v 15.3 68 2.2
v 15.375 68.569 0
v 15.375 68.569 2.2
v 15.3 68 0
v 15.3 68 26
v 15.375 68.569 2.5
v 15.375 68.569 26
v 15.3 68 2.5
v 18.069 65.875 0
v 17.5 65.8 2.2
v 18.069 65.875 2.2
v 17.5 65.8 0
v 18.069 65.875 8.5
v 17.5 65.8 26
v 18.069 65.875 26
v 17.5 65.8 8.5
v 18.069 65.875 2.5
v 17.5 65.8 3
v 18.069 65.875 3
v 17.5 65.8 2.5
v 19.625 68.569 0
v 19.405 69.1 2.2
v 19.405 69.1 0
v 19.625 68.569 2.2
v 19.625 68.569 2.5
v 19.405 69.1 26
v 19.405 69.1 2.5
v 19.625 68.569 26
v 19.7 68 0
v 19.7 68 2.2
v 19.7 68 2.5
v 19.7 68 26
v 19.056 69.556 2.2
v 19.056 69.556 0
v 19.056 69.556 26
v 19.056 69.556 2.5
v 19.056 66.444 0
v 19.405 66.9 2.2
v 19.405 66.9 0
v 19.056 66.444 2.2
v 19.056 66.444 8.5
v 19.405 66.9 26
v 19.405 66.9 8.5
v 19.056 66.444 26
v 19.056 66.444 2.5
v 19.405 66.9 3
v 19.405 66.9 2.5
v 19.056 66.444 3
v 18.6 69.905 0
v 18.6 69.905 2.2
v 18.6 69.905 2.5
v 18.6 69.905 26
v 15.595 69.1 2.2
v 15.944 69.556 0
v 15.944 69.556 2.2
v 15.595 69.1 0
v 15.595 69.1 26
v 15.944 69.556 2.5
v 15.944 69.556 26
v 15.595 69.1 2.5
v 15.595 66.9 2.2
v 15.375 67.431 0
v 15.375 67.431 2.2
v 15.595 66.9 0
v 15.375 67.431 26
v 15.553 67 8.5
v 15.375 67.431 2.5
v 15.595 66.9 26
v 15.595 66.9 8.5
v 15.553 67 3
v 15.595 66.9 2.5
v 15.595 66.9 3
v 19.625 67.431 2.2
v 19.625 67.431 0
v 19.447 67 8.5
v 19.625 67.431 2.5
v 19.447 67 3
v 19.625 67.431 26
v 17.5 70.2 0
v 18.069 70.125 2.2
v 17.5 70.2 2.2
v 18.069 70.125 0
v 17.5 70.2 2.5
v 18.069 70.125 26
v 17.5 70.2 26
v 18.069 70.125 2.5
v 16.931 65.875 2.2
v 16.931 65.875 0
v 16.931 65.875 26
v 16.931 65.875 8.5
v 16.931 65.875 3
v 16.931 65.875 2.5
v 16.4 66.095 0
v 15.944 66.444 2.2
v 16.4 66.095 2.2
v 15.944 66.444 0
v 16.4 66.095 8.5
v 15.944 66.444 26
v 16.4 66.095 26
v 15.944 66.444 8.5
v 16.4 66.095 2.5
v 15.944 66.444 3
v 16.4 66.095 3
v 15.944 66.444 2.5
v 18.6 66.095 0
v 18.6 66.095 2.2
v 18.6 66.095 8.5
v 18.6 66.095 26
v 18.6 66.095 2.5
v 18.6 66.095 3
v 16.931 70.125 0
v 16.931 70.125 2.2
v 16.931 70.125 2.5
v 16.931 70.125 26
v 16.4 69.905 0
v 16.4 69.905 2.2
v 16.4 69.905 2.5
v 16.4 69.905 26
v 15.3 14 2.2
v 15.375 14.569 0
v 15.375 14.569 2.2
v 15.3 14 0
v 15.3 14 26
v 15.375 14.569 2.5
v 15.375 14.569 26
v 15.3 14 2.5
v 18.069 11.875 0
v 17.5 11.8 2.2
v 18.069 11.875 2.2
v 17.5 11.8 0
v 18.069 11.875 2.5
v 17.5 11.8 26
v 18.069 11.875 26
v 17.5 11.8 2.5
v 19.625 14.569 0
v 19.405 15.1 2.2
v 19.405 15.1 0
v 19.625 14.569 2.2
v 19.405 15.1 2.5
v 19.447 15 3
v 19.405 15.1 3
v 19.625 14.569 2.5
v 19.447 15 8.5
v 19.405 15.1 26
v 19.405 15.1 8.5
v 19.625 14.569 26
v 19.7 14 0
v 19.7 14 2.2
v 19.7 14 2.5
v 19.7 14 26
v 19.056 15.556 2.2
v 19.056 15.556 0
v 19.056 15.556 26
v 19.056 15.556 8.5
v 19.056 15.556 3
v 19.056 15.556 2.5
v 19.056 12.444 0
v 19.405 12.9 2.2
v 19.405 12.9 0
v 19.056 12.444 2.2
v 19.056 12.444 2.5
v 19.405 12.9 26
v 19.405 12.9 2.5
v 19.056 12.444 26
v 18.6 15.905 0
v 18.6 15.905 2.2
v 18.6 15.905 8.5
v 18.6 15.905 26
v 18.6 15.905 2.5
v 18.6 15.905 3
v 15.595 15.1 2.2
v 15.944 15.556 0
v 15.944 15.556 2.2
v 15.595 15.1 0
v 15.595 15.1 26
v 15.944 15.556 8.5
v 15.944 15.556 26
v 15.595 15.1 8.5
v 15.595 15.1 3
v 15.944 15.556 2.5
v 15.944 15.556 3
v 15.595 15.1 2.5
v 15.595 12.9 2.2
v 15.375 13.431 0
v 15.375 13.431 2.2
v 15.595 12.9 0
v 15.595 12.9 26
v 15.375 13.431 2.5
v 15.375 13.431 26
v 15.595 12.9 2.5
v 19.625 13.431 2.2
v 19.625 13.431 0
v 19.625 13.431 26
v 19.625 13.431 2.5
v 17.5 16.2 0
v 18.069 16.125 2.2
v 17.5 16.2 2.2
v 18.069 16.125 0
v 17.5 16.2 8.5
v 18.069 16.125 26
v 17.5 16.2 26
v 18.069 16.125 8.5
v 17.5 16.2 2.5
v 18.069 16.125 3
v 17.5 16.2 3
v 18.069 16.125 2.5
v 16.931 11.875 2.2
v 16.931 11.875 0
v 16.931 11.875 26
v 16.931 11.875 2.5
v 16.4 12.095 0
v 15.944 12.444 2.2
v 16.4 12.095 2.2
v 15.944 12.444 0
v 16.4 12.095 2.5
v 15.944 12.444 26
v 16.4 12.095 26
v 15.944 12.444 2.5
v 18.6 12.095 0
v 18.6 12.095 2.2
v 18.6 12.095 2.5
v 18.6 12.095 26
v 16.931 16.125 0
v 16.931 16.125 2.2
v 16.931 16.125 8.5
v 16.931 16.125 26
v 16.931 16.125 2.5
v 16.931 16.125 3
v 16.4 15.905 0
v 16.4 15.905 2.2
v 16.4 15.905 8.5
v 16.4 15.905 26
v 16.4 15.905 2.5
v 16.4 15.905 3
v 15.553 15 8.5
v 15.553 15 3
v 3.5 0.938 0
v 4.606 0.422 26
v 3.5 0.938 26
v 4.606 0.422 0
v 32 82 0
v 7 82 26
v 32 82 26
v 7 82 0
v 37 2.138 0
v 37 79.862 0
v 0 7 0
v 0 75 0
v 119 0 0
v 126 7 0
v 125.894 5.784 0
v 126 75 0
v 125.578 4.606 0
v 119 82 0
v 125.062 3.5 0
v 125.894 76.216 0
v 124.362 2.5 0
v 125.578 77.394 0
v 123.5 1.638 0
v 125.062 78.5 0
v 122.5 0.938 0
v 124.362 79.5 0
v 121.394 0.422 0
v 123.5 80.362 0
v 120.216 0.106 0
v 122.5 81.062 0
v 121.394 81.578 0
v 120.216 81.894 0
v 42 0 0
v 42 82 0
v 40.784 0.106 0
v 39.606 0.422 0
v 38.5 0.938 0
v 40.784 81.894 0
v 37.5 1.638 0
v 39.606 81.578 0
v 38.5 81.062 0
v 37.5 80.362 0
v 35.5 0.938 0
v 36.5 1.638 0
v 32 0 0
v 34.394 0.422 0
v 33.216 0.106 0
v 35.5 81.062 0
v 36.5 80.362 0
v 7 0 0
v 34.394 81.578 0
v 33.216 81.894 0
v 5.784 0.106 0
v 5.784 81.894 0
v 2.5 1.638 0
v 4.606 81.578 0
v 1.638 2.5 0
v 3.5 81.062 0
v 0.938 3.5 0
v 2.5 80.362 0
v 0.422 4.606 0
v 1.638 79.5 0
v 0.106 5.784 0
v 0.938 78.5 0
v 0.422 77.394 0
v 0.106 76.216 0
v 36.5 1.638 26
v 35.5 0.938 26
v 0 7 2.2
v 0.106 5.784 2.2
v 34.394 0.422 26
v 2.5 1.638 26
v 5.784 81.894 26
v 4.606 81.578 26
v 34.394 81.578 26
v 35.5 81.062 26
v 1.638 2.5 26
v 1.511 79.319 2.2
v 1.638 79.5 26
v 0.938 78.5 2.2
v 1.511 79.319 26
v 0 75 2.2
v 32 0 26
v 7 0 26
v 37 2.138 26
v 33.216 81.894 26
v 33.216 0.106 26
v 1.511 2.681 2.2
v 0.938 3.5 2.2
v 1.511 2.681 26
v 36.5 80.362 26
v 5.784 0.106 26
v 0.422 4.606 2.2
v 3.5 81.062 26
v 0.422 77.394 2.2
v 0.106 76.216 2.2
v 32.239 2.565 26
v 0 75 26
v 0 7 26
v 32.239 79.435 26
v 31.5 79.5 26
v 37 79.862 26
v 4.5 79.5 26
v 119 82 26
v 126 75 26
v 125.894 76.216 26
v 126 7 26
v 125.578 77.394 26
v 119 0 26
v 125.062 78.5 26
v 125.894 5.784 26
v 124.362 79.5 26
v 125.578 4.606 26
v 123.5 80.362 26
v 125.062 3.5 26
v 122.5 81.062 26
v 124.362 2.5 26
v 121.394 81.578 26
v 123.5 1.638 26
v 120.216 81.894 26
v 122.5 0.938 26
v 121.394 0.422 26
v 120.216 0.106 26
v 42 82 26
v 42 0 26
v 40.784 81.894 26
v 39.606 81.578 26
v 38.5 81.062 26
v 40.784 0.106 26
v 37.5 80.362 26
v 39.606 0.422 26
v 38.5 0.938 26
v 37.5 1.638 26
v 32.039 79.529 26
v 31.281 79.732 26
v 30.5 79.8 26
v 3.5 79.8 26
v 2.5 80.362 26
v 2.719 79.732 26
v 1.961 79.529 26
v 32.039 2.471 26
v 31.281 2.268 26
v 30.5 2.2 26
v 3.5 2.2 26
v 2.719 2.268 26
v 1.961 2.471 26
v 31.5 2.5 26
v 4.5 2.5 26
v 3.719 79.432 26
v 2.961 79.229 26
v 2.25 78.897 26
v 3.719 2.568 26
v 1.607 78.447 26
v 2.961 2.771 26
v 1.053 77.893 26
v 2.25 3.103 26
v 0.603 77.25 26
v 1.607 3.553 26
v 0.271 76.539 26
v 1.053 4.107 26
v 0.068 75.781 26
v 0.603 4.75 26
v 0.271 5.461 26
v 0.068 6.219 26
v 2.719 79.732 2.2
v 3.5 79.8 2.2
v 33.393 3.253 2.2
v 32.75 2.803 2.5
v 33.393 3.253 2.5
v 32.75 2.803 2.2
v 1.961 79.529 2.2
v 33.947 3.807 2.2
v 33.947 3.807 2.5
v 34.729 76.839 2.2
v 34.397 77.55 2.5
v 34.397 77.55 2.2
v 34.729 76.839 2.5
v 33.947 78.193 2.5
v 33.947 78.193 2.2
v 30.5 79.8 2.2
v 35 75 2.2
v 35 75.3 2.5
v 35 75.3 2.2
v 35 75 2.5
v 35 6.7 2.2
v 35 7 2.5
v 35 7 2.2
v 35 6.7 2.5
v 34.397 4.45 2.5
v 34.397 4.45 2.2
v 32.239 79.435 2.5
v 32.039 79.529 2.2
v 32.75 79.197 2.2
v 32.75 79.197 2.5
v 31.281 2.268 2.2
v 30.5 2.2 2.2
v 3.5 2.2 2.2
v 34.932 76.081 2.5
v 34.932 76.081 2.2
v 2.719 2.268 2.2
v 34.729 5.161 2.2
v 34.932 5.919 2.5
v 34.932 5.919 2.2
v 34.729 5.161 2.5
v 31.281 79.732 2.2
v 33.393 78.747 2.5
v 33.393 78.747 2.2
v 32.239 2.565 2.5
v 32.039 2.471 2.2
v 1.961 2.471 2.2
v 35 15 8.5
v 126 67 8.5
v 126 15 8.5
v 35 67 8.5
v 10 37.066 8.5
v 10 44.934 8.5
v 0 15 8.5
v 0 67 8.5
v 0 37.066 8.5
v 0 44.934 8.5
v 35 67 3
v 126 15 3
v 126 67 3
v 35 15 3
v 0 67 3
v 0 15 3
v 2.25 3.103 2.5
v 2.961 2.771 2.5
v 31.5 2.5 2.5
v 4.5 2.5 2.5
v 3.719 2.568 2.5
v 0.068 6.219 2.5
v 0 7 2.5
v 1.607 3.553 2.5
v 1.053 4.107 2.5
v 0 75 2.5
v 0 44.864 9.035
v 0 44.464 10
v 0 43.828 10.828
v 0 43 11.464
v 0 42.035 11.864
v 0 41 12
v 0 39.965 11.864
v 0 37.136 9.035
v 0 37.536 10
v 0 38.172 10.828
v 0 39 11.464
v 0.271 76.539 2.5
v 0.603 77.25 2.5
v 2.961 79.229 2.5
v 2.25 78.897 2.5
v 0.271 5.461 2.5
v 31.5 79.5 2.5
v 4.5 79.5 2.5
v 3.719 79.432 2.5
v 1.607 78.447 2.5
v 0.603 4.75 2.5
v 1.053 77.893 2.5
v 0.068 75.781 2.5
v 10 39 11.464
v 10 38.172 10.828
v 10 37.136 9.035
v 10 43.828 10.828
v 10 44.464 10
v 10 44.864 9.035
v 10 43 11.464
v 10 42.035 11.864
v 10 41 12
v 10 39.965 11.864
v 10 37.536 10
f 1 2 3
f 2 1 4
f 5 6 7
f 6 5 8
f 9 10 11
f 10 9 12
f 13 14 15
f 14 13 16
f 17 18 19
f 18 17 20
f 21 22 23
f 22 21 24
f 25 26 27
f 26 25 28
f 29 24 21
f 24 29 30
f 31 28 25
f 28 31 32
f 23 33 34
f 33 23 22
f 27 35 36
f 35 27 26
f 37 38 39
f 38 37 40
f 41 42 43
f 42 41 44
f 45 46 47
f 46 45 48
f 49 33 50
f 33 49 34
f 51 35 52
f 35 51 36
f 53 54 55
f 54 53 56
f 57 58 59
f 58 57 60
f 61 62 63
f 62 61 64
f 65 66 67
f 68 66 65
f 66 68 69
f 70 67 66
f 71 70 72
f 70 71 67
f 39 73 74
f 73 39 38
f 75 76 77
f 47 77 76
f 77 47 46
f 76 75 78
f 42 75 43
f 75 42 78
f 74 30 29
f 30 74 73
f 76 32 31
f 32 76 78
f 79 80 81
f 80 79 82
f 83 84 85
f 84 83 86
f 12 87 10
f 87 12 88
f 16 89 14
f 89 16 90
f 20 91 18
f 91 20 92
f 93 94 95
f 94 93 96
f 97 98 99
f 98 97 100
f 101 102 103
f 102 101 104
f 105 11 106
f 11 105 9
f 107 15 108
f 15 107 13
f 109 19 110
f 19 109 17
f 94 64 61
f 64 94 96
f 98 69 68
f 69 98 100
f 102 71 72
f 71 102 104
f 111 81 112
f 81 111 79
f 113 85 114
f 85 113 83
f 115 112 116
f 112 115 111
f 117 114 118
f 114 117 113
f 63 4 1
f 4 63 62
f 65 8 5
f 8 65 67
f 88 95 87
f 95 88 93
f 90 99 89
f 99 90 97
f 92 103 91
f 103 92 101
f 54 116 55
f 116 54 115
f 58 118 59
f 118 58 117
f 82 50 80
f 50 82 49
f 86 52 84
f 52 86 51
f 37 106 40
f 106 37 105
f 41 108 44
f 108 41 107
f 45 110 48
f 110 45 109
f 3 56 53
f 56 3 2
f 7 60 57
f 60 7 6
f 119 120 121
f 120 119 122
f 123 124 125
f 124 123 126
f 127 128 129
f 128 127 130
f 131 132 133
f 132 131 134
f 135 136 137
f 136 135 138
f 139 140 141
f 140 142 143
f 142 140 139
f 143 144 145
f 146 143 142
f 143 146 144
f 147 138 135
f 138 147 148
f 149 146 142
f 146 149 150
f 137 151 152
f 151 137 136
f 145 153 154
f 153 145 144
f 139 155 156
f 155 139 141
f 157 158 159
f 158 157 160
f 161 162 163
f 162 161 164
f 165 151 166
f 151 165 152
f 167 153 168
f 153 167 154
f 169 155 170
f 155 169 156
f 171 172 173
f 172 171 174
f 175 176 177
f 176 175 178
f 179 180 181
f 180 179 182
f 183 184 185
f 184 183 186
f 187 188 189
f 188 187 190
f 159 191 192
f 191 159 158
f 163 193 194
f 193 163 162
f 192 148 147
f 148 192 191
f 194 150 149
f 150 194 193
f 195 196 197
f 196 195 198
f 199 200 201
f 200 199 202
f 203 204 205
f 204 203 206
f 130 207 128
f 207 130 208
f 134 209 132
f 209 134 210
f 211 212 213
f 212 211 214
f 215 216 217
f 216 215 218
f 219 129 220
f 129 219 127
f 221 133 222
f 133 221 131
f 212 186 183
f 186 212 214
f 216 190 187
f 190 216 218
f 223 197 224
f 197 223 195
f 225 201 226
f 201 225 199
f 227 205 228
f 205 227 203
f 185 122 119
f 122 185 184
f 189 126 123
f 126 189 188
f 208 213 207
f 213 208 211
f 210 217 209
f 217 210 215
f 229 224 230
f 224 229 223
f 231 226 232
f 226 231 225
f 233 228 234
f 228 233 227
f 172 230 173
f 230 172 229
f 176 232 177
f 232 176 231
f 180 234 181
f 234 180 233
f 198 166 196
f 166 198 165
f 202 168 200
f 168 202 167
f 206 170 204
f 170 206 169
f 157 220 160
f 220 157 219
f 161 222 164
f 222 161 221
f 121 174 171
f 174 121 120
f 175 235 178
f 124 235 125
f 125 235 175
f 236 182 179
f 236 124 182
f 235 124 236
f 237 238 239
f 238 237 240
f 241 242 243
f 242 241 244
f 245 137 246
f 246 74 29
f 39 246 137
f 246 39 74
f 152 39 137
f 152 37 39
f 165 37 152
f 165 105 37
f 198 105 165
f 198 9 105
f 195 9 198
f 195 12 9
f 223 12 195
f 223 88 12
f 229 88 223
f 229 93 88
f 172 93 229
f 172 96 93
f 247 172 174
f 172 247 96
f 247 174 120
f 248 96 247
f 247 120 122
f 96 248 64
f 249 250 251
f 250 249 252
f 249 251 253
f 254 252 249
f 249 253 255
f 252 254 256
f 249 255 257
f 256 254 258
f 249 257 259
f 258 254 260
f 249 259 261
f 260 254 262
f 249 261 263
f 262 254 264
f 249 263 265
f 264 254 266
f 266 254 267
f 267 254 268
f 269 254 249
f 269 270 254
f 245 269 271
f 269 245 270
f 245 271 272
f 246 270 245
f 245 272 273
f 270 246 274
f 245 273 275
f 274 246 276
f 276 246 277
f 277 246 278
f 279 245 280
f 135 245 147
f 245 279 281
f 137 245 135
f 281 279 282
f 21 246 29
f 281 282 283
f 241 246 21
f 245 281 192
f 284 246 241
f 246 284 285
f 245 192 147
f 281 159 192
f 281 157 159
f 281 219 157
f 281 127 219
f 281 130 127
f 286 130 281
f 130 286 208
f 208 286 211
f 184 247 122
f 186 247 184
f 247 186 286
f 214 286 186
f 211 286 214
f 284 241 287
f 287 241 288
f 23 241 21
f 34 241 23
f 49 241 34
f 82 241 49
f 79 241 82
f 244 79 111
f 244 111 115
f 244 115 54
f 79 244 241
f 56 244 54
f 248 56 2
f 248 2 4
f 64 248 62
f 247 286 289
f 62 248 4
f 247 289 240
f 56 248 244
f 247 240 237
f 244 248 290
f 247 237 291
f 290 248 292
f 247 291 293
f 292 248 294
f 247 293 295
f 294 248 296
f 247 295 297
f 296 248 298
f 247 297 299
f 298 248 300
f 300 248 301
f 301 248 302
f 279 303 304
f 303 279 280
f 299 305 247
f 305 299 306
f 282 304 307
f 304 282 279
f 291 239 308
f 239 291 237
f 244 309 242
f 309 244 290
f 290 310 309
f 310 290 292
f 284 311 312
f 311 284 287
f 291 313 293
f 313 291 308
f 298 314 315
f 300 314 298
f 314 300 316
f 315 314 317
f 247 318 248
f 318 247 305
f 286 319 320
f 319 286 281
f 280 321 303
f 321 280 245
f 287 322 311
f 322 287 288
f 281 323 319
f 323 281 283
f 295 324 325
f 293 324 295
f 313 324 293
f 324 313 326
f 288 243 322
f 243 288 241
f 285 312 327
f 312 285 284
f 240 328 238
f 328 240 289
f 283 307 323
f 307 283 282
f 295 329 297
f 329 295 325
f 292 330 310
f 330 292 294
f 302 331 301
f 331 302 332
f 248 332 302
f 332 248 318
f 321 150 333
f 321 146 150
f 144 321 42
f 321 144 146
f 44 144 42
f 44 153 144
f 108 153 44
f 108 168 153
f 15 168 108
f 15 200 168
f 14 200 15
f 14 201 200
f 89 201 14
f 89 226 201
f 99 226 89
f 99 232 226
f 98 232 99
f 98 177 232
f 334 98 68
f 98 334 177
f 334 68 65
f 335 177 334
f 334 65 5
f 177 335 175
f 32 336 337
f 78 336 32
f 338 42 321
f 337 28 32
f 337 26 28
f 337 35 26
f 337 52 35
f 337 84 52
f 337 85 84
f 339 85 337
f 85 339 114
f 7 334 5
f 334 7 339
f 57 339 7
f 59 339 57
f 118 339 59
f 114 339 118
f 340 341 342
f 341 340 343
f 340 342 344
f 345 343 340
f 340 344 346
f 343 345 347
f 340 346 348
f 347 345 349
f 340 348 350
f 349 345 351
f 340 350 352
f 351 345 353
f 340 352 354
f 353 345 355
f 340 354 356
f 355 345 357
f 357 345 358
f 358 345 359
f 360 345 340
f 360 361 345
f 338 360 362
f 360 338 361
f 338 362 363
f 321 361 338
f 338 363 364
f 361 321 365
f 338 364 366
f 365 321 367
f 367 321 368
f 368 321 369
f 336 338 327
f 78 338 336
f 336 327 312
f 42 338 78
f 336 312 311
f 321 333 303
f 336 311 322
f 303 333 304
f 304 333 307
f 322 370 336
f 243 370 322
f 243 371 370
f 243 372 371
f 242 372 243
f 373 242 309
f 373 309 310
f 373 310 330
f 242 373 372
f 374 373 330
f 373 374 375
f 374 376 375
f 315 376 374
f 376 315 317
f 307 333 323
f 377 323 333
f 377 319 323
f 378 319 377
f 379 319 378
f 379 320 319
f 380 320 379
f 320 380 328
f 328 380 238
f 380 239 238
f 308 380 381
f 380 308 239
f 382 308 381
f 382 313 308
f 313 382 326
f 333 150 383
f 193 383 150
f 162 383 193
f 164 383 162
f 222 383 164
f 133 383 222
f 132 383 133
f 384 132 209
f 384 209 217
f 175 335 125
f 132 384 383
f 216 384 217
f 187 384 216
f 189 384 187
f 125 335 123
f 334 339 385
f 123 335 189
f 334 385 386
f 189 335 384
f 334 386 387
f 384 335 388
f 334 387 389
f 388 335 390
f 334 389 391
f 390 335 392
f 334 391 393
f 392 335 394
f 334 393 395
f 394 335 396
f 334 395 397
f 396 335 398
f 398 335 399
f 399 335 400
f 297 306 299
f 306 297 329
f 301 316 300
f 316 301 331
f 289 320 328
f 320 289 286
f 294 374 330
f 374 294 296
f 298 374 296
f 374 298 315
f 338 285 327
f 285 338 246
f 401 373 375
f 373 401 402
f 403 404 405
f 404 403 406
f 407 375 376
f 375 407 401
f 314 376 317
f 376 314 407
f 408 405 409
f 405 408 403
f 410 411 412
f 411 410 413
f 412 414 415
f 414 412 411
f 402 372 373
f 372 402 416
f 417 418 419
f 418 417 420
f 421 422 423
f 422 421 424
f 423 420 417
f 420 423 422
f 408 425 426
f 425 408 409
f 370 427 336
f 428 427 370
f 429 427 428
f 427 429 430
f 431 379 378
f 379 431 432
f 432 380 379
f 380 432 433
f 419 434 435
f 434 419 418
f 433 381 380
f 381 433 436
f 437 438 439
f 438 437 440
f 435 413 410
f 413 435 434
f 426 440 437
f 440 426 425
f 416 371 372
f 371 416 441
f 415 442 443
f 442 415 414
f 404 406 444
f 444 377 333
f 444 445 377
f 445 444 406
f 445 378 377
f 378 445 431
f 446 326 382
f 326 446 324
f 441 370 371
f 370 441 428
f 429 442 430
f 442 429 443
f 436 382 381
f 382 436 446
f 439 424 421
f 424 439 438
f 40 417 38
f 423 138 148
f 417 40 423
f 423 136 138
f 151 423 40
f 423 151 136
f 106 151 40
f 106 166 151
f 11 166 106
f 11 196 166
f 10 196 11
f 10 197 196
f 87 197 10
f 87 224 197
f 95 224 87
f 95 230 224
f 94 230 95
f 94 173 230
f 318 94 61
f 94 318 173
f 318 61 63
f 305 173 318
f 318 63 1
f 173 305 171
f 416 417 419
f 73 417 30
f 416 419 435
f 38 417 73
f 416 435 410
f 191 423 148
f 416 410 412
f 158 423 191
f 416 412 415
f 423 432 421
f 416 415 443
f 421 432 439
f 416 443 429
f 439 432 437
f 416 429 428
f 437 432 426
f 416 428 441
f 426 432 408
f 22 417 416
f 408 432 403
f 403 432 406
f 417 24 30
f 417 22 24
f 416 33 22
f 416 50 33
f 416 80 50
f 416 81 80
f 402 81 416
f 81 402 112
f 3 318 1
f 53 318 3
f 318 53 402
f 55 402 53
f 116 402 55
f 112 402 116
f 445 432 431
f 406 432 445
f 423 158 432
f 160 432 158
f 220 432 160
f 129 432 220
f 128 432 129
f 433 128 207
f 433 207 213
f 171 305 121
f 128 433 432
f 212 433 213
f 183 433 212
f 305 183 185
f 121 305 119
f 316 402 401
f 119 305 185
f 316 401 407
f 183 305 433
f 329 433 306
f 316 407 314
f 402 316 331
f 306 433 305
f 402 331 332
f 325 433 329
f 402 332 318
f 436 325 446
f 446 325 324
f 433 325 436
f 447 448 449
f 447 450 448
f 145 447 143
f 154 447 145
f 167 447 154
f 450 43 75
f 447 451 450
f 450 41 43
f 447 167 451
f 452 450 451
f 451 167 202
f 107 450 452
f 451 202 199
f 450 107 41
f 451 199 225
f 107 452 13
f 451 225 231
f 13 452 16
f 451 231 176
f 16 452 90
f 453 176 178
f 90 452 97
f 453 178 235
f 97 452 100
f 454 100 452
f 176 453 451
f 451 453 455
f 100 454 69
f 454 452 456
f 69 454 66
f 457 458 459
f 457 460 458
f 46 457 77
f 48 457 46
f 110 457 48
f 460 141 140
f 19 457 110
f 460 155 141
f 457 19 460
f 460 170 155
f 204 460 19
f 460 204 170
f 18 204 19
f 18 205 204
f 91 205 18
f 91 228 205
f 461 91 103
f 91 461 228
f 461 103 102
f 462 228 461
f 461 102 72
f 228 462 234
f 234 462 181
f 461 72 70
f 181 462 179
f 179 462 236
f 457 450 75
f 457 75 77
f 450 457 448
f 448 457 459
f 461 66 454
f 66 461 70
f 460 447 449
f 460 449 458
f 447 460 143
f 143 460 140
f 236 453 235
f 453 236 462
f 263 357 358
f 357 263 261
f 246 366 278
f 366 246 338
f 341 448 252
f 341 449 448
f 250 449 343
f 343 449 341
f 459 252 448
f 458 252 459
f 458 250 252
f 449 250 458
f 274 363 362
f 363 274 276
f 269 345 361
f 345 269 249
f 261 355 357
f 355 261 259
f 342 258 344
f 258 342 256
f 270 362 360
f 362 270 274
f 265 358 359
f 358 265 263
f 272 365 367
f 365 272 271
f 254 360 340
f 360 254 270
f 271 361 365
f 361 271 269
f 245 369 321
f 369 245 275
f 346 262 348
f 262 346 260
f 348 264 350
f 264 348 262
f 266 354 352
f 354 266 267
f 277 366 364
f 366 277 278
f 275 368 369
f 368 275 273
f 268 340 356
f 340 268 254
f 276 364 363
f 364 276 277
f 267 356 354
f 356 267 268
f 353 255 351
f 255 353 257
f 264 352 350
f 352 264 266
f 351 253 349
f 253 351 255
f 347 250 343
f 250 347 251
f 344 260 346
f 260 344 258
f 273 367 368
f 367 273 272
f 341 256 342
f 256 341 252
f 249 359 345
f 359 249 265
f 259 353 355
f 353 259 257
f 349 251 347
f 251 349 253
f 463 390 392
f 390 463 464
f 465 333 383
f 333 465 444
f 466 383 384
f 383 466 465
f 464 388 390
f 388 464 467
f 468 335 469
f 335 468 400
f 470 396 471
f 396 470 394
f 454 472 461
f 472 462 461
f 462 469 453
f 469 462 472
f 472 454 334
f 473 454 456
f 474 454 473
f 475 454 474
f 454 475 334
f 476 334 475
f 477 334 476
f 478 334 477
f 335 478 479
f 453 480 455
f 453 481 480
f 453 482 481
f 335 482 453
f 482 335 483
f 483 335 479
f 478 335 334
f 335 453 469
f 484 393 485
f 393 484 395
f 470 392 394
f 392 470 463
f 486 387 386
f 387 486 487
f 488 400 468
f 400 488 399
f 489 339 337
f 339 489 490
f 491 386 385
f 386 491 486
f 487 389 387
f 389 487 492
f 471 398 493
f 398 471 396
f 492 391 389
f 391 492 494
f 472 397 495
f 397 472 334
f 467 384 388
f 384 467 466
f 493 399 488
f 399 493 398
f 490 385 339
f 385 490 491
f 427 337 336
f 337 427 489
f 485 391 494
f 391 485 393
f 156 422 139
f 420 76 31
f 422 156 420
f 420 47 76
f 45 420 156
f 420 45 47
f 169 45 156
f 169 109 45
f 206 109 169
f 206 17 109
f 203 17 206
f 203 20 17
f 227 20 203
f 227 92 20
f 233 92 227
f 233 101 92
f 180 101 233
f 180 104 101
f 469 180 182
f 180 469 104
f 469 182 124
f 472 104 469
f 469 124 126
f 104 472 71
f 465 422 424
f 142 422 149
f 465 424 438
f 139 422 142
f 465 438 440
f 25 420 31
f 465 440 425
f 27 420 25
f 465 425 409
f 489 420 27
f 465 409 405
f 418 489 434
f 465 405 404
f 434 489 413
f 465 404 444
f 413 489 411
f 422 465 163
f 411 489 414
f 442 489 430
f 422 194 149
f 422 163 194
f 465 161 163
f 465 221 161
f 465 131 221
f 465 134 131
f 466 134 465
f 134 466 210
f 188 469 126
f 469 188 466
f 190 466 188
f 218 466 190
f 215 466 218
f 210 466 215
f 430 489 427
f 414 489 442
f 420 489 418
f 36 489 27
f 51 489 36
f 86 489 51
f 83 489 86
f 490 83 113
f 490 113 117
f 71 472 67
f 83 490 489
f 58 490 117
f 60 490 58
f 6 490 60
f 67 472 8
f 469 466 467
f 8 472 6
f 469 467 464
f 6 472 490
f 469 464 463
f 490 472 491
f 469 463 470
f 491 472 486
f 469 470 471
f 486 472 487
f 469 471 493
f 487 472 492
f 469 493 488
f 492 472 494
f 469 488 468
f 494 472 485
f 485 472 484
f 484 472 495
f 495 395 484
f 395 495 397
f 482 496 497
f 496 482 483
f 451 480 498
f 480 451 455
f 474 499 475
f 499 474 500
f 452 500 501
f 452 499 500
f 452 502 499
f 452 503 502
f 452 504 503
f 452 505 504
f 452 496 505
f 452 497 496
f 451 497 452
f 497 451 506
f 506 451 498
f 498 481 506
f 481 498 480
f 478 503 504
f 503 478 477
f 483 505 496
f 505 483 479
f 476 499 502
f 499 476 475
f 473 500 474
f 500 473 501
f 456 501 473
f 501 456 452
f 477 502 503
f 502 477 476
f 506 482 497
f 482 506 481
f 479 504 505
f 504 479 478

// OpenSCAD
$fn = 36;

// Parámetros
pod_l = 126.0;
pod_w = 82.0;
pod_base_h = 26.0;
pod_r = 7.0;
pod_wall = 2.8;

cradle_depth = 35.0;
cradle_wall = 2.5;
cradle_floor = 2.5;
cradle_tol = 0.3; // Holgura para encastre suave de TPU sobre ASA

strap_slot_w = 52.0;
strap_slot_h = 5.5;
tunnel_t = 3.0;

module r_box(l, w, h, r) {
    hull() {
        translate([r, r, 0]) cylinder(r=r, h=h);
        translate([l-r, r, 0]) cylinder(r=r, h=h);
        translate([r, w-r, 0]) cylinder(r=r, h=h);
        translate([l-r, w-r, 0]) cylinder(r=r, h=h);
    }
}

// 1. Cuna receptora en TPU (el brazo que sale del puente)
module tpu_cradle_sleeve() {
    color([0.18, 0.20, 0.22]) // TPU grafito
    difference() {
        // Bloque exterior continuo con el perfil del pod
        r_box(cradle_depth + 4, pod_w, pod_base_h, pod_r);

        // Cavidad/Bolsillo interior donde entra la lengüeta del pod
        translate([-1, cradle_wall - cradle_tol, cradle_floor - cradle_tol]) {
            r_box(cradle_depth + 1, pod_w - 2*(cradle_wall - cradle_tol), 
                  pod_base_h + 2, max(1, pod_r - cradle_wall));
        }

        // Túnel pasacorreas inferior
        translate([-5, (pod_w - strap_slot_w)/2, tunnel_t]) {
            cube([cradle_depth + 15, strap_slot_w, strap_slot_h]);
        }

        // Taladros para tornillos M4 de fijación (2 laterales)
        for (dy = [pod_w/2 - 14, -pod_w/2 + 14]) {
            translate([cradle_depth/2, pod_w/2 + dy, -5])
                cylinder(r=2.2, h=pod_base_h + 10, $fn=24);
        }

        // Pasacables hacia el interior del puente (X=0)
        translate([-5, pod_w/2, 8.0])
            rotate([0, 90, 0]) cylinder(r=4.0, h=15, $fn=24);
    }
}

// 2. Base rígida en ASA con el escalón macho rebajado
module asa_pod_with_step() {
    color([0.94, 0.42, 0.12]) // ASA Naranja
    difference() {
        union() {
            // Sección frontal completa (X = cradle_depth a pod_l)
            translate([cradle_depth, 0, 0]) {
                difference() {
                    r_box(pod_l - cradle_depth, pod_w, pod_base_h, pod_r);
                    // Cara de tope plana en X=0 local
                }
            }
            // Lengüeta rebajada que embona en la cuna de TPU (X = 0 a cradle_depth)
            translate([0, cradle_wall, cradle_floor]) {
                r_box(cradle_depth + 1, pod_w - 2*cradle_wall, pod_base_h - cradle_floor, max(1, pod_r - cradle_wall));
            }
        }

        // Túnel pasacorreas continuo
        translate([-5, (pod_w - strap_slot_w)/2, tunnel_t]) {
            cube([pod_l + 10, strap_slot_w, strap_slot_h]);
        }

        // Taladros M4 alineados con la cuna
        for (dy = [pod_w/2 - 14, -pod_w/2 + 14]) {
            translate([cradle_depth/2, pod_w/2 + dy, -5])
                cylinder(r=2.2, h=pod_base_h + 10, $fn=24);
        }

        // Pasacables frontal en la lengüeta
        translate([-5, pod_w/2, 8.0])
            rotate([0, 90, 0]) cylinder(r=4.0, h=15, $fn=24);
    }
}

// Visualización ensamblada: Cuna TPU + Base ASA
tpu_cradle_sleeve();
asa_pod_with_step();
